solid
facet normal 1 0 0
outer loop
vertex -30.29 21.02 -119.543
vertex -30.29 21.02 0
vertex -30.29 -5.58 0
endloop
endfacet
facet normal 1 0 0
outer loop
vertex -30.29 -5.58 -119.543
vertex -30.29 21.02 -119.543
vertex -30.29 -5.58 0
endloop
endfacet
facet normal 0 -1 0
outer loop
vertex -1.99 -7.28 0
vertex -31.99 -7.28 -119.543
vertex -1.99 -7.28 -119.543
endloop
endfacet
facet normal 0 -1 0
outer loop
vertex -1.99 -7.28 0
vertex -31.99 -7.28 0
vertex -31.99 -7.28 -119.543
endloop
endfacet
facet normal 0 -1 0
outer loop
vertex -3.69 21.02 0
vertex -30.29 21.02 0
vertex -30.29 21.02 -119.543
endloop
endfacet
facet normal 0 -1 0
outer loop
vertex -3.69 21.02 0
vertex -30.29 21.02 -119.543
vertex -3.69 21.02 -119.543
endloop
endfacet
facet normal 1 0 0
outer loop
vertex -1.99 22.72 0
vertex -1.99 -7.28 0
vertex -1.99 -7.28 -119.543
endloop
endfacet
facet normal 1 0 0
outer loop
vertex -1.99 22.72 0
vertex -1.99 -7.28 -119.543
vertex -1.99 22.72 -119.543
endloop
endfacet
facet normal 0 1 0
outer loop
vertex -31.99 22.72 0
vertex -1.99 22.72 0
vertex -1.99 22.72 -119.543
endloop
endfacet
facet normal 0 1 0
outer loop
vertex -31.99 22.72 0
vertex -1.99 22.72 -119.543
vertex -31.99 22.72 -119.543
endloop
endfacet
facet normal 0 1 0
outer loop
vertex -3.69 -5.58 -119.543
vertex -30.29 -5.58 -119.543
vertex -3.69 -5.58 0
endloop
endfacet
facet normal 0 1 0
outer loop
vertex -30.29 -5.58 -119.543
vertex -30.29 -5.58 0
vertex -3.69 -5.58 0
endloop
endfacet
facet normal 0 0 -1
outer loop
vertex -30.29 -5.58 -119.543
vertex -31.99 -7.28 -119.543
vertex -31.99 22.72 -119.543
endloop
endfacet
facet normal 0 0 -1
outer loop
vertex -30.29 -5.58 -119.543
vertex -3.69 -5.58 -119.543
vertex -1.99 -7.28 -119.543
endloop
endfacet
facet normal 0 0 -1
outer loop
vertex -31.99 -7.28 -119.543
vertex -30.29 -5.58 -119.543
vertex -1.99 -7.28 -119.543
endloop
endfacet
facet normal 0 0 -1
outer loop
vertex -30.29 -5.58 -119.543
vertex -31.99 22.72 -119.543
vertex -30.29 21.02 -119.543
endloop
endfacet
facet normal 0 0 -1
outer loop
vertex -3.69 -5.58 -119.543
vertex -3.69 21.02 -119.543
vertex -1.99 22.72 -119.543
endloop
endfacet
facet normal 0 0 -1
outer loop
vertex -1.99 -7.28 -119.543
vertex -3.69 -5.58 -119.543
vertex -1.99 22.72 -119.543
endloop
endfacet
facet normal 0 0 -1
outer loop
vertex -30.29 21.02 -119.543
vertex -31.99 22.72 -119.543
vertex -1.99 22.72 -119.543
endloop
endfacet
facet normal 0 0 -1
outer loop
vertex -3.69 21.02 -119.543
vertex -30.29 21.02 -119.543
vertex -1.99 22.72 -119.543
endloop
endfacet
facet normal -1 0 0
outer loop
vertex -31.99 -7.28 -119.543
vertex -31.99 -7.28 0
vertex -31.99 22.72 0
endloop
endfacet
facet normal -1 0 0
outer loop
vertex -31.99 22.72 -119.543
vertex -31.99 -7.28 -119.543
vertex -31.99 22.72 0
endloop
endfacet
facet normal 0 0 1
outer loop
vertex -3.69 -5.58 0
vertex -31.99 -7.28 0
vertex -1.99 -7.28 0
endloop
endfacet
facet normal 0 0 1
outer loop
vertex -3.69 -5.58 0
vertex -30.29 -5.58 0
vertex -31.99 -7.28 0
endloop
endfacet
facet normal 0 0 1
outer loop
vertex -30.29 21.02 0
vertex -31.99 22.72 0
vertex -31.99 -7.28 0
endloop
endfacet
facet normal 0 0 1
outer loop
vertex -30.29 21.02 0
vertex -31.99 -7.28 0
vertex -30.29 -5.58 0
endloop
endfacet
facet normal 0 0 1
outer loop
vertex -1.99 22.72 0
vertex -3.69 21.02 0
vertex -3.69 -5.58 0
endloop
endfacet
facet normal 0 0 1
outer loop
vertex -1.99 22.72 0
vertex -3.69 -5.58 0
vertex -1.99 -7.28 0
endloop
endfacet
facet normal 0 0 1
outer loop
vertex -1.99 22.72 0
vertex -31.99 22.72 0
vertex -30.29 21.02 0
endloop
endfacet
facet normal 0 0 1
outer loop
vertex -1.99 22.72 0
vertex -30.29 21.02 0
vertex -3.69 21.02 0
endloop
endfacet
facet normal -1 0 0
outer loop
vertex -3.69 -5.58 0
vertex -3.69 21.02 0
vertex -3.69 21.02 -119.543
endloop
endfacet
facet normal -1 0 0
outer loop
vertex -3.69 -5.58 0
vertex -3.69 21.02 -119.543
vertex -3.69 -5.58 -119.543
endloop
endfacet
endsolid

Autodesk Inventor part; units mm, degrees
ref_plane "YZ Plane" through (0, 0, 0) normal (1, 0, 0) x (0, 1, 0)
ref_plane "XZ Plane" through (0, 0, 0) normal (0, 1, 0) x (-1, 0, 0)
ref_plane "XY Plane" through (0, 0, 0) normal (0, 0, 1) x (1, 0, 0)
sketch "Sketch1" plane through (0, 0, 0) normal (0, 0, 1) x (1, 0, 0)
  line L0 (-31.9903, -7.2804) -> (-1.9903, -7.2804)
  line L1 (-1.9903, -7.2804) -> (-1.9903, 22.7196)
  line L2 (-1.9903, 22.7196) -> (-31.9903, 22.7196)
  line L3 (-31.9903, -7.2804) -> (-31.9903, 22.7196)
  line L4 (-30.2903, 22.7196) -> (-30.2903, -7.2804)
  line L5 (-31.9903, -5.5804) -> (-1.9903, -5.5804)
  line L6 (-3.6903, 22.7196) -> (-3.6903, -7.2804)
  line L7 (-31.9903, 21.0196) -> (-1.9903, 21.0196)
  point P0 (0, 0)
  point P1 (0, 0)
  point P2 (-3.6903, 21.0196)
  point P3 (-30.2903, 21.0196)
  point P4 (-30.2903, -5.5804)
  point P5 (-3.6903, -5.5804)
  dimension "d0" = 30
  dimension "d1" = 30
  dimension "d2" = 1.7
  dimension "d3" = 1.7
  dimension "d4" = 1.7
  dimension "d5" = 1.7
extrude "Extrusion1" add sketch "Sketch1" against normal blind 119.543
extrude "Extrusion2" cut sketch "Sketch1" against normal blind 119.543 contours L4 L7 L6 L5
properties part number "Cablecanal Ranurado 30x30 L=115  mm" material "PVC-Piping"
